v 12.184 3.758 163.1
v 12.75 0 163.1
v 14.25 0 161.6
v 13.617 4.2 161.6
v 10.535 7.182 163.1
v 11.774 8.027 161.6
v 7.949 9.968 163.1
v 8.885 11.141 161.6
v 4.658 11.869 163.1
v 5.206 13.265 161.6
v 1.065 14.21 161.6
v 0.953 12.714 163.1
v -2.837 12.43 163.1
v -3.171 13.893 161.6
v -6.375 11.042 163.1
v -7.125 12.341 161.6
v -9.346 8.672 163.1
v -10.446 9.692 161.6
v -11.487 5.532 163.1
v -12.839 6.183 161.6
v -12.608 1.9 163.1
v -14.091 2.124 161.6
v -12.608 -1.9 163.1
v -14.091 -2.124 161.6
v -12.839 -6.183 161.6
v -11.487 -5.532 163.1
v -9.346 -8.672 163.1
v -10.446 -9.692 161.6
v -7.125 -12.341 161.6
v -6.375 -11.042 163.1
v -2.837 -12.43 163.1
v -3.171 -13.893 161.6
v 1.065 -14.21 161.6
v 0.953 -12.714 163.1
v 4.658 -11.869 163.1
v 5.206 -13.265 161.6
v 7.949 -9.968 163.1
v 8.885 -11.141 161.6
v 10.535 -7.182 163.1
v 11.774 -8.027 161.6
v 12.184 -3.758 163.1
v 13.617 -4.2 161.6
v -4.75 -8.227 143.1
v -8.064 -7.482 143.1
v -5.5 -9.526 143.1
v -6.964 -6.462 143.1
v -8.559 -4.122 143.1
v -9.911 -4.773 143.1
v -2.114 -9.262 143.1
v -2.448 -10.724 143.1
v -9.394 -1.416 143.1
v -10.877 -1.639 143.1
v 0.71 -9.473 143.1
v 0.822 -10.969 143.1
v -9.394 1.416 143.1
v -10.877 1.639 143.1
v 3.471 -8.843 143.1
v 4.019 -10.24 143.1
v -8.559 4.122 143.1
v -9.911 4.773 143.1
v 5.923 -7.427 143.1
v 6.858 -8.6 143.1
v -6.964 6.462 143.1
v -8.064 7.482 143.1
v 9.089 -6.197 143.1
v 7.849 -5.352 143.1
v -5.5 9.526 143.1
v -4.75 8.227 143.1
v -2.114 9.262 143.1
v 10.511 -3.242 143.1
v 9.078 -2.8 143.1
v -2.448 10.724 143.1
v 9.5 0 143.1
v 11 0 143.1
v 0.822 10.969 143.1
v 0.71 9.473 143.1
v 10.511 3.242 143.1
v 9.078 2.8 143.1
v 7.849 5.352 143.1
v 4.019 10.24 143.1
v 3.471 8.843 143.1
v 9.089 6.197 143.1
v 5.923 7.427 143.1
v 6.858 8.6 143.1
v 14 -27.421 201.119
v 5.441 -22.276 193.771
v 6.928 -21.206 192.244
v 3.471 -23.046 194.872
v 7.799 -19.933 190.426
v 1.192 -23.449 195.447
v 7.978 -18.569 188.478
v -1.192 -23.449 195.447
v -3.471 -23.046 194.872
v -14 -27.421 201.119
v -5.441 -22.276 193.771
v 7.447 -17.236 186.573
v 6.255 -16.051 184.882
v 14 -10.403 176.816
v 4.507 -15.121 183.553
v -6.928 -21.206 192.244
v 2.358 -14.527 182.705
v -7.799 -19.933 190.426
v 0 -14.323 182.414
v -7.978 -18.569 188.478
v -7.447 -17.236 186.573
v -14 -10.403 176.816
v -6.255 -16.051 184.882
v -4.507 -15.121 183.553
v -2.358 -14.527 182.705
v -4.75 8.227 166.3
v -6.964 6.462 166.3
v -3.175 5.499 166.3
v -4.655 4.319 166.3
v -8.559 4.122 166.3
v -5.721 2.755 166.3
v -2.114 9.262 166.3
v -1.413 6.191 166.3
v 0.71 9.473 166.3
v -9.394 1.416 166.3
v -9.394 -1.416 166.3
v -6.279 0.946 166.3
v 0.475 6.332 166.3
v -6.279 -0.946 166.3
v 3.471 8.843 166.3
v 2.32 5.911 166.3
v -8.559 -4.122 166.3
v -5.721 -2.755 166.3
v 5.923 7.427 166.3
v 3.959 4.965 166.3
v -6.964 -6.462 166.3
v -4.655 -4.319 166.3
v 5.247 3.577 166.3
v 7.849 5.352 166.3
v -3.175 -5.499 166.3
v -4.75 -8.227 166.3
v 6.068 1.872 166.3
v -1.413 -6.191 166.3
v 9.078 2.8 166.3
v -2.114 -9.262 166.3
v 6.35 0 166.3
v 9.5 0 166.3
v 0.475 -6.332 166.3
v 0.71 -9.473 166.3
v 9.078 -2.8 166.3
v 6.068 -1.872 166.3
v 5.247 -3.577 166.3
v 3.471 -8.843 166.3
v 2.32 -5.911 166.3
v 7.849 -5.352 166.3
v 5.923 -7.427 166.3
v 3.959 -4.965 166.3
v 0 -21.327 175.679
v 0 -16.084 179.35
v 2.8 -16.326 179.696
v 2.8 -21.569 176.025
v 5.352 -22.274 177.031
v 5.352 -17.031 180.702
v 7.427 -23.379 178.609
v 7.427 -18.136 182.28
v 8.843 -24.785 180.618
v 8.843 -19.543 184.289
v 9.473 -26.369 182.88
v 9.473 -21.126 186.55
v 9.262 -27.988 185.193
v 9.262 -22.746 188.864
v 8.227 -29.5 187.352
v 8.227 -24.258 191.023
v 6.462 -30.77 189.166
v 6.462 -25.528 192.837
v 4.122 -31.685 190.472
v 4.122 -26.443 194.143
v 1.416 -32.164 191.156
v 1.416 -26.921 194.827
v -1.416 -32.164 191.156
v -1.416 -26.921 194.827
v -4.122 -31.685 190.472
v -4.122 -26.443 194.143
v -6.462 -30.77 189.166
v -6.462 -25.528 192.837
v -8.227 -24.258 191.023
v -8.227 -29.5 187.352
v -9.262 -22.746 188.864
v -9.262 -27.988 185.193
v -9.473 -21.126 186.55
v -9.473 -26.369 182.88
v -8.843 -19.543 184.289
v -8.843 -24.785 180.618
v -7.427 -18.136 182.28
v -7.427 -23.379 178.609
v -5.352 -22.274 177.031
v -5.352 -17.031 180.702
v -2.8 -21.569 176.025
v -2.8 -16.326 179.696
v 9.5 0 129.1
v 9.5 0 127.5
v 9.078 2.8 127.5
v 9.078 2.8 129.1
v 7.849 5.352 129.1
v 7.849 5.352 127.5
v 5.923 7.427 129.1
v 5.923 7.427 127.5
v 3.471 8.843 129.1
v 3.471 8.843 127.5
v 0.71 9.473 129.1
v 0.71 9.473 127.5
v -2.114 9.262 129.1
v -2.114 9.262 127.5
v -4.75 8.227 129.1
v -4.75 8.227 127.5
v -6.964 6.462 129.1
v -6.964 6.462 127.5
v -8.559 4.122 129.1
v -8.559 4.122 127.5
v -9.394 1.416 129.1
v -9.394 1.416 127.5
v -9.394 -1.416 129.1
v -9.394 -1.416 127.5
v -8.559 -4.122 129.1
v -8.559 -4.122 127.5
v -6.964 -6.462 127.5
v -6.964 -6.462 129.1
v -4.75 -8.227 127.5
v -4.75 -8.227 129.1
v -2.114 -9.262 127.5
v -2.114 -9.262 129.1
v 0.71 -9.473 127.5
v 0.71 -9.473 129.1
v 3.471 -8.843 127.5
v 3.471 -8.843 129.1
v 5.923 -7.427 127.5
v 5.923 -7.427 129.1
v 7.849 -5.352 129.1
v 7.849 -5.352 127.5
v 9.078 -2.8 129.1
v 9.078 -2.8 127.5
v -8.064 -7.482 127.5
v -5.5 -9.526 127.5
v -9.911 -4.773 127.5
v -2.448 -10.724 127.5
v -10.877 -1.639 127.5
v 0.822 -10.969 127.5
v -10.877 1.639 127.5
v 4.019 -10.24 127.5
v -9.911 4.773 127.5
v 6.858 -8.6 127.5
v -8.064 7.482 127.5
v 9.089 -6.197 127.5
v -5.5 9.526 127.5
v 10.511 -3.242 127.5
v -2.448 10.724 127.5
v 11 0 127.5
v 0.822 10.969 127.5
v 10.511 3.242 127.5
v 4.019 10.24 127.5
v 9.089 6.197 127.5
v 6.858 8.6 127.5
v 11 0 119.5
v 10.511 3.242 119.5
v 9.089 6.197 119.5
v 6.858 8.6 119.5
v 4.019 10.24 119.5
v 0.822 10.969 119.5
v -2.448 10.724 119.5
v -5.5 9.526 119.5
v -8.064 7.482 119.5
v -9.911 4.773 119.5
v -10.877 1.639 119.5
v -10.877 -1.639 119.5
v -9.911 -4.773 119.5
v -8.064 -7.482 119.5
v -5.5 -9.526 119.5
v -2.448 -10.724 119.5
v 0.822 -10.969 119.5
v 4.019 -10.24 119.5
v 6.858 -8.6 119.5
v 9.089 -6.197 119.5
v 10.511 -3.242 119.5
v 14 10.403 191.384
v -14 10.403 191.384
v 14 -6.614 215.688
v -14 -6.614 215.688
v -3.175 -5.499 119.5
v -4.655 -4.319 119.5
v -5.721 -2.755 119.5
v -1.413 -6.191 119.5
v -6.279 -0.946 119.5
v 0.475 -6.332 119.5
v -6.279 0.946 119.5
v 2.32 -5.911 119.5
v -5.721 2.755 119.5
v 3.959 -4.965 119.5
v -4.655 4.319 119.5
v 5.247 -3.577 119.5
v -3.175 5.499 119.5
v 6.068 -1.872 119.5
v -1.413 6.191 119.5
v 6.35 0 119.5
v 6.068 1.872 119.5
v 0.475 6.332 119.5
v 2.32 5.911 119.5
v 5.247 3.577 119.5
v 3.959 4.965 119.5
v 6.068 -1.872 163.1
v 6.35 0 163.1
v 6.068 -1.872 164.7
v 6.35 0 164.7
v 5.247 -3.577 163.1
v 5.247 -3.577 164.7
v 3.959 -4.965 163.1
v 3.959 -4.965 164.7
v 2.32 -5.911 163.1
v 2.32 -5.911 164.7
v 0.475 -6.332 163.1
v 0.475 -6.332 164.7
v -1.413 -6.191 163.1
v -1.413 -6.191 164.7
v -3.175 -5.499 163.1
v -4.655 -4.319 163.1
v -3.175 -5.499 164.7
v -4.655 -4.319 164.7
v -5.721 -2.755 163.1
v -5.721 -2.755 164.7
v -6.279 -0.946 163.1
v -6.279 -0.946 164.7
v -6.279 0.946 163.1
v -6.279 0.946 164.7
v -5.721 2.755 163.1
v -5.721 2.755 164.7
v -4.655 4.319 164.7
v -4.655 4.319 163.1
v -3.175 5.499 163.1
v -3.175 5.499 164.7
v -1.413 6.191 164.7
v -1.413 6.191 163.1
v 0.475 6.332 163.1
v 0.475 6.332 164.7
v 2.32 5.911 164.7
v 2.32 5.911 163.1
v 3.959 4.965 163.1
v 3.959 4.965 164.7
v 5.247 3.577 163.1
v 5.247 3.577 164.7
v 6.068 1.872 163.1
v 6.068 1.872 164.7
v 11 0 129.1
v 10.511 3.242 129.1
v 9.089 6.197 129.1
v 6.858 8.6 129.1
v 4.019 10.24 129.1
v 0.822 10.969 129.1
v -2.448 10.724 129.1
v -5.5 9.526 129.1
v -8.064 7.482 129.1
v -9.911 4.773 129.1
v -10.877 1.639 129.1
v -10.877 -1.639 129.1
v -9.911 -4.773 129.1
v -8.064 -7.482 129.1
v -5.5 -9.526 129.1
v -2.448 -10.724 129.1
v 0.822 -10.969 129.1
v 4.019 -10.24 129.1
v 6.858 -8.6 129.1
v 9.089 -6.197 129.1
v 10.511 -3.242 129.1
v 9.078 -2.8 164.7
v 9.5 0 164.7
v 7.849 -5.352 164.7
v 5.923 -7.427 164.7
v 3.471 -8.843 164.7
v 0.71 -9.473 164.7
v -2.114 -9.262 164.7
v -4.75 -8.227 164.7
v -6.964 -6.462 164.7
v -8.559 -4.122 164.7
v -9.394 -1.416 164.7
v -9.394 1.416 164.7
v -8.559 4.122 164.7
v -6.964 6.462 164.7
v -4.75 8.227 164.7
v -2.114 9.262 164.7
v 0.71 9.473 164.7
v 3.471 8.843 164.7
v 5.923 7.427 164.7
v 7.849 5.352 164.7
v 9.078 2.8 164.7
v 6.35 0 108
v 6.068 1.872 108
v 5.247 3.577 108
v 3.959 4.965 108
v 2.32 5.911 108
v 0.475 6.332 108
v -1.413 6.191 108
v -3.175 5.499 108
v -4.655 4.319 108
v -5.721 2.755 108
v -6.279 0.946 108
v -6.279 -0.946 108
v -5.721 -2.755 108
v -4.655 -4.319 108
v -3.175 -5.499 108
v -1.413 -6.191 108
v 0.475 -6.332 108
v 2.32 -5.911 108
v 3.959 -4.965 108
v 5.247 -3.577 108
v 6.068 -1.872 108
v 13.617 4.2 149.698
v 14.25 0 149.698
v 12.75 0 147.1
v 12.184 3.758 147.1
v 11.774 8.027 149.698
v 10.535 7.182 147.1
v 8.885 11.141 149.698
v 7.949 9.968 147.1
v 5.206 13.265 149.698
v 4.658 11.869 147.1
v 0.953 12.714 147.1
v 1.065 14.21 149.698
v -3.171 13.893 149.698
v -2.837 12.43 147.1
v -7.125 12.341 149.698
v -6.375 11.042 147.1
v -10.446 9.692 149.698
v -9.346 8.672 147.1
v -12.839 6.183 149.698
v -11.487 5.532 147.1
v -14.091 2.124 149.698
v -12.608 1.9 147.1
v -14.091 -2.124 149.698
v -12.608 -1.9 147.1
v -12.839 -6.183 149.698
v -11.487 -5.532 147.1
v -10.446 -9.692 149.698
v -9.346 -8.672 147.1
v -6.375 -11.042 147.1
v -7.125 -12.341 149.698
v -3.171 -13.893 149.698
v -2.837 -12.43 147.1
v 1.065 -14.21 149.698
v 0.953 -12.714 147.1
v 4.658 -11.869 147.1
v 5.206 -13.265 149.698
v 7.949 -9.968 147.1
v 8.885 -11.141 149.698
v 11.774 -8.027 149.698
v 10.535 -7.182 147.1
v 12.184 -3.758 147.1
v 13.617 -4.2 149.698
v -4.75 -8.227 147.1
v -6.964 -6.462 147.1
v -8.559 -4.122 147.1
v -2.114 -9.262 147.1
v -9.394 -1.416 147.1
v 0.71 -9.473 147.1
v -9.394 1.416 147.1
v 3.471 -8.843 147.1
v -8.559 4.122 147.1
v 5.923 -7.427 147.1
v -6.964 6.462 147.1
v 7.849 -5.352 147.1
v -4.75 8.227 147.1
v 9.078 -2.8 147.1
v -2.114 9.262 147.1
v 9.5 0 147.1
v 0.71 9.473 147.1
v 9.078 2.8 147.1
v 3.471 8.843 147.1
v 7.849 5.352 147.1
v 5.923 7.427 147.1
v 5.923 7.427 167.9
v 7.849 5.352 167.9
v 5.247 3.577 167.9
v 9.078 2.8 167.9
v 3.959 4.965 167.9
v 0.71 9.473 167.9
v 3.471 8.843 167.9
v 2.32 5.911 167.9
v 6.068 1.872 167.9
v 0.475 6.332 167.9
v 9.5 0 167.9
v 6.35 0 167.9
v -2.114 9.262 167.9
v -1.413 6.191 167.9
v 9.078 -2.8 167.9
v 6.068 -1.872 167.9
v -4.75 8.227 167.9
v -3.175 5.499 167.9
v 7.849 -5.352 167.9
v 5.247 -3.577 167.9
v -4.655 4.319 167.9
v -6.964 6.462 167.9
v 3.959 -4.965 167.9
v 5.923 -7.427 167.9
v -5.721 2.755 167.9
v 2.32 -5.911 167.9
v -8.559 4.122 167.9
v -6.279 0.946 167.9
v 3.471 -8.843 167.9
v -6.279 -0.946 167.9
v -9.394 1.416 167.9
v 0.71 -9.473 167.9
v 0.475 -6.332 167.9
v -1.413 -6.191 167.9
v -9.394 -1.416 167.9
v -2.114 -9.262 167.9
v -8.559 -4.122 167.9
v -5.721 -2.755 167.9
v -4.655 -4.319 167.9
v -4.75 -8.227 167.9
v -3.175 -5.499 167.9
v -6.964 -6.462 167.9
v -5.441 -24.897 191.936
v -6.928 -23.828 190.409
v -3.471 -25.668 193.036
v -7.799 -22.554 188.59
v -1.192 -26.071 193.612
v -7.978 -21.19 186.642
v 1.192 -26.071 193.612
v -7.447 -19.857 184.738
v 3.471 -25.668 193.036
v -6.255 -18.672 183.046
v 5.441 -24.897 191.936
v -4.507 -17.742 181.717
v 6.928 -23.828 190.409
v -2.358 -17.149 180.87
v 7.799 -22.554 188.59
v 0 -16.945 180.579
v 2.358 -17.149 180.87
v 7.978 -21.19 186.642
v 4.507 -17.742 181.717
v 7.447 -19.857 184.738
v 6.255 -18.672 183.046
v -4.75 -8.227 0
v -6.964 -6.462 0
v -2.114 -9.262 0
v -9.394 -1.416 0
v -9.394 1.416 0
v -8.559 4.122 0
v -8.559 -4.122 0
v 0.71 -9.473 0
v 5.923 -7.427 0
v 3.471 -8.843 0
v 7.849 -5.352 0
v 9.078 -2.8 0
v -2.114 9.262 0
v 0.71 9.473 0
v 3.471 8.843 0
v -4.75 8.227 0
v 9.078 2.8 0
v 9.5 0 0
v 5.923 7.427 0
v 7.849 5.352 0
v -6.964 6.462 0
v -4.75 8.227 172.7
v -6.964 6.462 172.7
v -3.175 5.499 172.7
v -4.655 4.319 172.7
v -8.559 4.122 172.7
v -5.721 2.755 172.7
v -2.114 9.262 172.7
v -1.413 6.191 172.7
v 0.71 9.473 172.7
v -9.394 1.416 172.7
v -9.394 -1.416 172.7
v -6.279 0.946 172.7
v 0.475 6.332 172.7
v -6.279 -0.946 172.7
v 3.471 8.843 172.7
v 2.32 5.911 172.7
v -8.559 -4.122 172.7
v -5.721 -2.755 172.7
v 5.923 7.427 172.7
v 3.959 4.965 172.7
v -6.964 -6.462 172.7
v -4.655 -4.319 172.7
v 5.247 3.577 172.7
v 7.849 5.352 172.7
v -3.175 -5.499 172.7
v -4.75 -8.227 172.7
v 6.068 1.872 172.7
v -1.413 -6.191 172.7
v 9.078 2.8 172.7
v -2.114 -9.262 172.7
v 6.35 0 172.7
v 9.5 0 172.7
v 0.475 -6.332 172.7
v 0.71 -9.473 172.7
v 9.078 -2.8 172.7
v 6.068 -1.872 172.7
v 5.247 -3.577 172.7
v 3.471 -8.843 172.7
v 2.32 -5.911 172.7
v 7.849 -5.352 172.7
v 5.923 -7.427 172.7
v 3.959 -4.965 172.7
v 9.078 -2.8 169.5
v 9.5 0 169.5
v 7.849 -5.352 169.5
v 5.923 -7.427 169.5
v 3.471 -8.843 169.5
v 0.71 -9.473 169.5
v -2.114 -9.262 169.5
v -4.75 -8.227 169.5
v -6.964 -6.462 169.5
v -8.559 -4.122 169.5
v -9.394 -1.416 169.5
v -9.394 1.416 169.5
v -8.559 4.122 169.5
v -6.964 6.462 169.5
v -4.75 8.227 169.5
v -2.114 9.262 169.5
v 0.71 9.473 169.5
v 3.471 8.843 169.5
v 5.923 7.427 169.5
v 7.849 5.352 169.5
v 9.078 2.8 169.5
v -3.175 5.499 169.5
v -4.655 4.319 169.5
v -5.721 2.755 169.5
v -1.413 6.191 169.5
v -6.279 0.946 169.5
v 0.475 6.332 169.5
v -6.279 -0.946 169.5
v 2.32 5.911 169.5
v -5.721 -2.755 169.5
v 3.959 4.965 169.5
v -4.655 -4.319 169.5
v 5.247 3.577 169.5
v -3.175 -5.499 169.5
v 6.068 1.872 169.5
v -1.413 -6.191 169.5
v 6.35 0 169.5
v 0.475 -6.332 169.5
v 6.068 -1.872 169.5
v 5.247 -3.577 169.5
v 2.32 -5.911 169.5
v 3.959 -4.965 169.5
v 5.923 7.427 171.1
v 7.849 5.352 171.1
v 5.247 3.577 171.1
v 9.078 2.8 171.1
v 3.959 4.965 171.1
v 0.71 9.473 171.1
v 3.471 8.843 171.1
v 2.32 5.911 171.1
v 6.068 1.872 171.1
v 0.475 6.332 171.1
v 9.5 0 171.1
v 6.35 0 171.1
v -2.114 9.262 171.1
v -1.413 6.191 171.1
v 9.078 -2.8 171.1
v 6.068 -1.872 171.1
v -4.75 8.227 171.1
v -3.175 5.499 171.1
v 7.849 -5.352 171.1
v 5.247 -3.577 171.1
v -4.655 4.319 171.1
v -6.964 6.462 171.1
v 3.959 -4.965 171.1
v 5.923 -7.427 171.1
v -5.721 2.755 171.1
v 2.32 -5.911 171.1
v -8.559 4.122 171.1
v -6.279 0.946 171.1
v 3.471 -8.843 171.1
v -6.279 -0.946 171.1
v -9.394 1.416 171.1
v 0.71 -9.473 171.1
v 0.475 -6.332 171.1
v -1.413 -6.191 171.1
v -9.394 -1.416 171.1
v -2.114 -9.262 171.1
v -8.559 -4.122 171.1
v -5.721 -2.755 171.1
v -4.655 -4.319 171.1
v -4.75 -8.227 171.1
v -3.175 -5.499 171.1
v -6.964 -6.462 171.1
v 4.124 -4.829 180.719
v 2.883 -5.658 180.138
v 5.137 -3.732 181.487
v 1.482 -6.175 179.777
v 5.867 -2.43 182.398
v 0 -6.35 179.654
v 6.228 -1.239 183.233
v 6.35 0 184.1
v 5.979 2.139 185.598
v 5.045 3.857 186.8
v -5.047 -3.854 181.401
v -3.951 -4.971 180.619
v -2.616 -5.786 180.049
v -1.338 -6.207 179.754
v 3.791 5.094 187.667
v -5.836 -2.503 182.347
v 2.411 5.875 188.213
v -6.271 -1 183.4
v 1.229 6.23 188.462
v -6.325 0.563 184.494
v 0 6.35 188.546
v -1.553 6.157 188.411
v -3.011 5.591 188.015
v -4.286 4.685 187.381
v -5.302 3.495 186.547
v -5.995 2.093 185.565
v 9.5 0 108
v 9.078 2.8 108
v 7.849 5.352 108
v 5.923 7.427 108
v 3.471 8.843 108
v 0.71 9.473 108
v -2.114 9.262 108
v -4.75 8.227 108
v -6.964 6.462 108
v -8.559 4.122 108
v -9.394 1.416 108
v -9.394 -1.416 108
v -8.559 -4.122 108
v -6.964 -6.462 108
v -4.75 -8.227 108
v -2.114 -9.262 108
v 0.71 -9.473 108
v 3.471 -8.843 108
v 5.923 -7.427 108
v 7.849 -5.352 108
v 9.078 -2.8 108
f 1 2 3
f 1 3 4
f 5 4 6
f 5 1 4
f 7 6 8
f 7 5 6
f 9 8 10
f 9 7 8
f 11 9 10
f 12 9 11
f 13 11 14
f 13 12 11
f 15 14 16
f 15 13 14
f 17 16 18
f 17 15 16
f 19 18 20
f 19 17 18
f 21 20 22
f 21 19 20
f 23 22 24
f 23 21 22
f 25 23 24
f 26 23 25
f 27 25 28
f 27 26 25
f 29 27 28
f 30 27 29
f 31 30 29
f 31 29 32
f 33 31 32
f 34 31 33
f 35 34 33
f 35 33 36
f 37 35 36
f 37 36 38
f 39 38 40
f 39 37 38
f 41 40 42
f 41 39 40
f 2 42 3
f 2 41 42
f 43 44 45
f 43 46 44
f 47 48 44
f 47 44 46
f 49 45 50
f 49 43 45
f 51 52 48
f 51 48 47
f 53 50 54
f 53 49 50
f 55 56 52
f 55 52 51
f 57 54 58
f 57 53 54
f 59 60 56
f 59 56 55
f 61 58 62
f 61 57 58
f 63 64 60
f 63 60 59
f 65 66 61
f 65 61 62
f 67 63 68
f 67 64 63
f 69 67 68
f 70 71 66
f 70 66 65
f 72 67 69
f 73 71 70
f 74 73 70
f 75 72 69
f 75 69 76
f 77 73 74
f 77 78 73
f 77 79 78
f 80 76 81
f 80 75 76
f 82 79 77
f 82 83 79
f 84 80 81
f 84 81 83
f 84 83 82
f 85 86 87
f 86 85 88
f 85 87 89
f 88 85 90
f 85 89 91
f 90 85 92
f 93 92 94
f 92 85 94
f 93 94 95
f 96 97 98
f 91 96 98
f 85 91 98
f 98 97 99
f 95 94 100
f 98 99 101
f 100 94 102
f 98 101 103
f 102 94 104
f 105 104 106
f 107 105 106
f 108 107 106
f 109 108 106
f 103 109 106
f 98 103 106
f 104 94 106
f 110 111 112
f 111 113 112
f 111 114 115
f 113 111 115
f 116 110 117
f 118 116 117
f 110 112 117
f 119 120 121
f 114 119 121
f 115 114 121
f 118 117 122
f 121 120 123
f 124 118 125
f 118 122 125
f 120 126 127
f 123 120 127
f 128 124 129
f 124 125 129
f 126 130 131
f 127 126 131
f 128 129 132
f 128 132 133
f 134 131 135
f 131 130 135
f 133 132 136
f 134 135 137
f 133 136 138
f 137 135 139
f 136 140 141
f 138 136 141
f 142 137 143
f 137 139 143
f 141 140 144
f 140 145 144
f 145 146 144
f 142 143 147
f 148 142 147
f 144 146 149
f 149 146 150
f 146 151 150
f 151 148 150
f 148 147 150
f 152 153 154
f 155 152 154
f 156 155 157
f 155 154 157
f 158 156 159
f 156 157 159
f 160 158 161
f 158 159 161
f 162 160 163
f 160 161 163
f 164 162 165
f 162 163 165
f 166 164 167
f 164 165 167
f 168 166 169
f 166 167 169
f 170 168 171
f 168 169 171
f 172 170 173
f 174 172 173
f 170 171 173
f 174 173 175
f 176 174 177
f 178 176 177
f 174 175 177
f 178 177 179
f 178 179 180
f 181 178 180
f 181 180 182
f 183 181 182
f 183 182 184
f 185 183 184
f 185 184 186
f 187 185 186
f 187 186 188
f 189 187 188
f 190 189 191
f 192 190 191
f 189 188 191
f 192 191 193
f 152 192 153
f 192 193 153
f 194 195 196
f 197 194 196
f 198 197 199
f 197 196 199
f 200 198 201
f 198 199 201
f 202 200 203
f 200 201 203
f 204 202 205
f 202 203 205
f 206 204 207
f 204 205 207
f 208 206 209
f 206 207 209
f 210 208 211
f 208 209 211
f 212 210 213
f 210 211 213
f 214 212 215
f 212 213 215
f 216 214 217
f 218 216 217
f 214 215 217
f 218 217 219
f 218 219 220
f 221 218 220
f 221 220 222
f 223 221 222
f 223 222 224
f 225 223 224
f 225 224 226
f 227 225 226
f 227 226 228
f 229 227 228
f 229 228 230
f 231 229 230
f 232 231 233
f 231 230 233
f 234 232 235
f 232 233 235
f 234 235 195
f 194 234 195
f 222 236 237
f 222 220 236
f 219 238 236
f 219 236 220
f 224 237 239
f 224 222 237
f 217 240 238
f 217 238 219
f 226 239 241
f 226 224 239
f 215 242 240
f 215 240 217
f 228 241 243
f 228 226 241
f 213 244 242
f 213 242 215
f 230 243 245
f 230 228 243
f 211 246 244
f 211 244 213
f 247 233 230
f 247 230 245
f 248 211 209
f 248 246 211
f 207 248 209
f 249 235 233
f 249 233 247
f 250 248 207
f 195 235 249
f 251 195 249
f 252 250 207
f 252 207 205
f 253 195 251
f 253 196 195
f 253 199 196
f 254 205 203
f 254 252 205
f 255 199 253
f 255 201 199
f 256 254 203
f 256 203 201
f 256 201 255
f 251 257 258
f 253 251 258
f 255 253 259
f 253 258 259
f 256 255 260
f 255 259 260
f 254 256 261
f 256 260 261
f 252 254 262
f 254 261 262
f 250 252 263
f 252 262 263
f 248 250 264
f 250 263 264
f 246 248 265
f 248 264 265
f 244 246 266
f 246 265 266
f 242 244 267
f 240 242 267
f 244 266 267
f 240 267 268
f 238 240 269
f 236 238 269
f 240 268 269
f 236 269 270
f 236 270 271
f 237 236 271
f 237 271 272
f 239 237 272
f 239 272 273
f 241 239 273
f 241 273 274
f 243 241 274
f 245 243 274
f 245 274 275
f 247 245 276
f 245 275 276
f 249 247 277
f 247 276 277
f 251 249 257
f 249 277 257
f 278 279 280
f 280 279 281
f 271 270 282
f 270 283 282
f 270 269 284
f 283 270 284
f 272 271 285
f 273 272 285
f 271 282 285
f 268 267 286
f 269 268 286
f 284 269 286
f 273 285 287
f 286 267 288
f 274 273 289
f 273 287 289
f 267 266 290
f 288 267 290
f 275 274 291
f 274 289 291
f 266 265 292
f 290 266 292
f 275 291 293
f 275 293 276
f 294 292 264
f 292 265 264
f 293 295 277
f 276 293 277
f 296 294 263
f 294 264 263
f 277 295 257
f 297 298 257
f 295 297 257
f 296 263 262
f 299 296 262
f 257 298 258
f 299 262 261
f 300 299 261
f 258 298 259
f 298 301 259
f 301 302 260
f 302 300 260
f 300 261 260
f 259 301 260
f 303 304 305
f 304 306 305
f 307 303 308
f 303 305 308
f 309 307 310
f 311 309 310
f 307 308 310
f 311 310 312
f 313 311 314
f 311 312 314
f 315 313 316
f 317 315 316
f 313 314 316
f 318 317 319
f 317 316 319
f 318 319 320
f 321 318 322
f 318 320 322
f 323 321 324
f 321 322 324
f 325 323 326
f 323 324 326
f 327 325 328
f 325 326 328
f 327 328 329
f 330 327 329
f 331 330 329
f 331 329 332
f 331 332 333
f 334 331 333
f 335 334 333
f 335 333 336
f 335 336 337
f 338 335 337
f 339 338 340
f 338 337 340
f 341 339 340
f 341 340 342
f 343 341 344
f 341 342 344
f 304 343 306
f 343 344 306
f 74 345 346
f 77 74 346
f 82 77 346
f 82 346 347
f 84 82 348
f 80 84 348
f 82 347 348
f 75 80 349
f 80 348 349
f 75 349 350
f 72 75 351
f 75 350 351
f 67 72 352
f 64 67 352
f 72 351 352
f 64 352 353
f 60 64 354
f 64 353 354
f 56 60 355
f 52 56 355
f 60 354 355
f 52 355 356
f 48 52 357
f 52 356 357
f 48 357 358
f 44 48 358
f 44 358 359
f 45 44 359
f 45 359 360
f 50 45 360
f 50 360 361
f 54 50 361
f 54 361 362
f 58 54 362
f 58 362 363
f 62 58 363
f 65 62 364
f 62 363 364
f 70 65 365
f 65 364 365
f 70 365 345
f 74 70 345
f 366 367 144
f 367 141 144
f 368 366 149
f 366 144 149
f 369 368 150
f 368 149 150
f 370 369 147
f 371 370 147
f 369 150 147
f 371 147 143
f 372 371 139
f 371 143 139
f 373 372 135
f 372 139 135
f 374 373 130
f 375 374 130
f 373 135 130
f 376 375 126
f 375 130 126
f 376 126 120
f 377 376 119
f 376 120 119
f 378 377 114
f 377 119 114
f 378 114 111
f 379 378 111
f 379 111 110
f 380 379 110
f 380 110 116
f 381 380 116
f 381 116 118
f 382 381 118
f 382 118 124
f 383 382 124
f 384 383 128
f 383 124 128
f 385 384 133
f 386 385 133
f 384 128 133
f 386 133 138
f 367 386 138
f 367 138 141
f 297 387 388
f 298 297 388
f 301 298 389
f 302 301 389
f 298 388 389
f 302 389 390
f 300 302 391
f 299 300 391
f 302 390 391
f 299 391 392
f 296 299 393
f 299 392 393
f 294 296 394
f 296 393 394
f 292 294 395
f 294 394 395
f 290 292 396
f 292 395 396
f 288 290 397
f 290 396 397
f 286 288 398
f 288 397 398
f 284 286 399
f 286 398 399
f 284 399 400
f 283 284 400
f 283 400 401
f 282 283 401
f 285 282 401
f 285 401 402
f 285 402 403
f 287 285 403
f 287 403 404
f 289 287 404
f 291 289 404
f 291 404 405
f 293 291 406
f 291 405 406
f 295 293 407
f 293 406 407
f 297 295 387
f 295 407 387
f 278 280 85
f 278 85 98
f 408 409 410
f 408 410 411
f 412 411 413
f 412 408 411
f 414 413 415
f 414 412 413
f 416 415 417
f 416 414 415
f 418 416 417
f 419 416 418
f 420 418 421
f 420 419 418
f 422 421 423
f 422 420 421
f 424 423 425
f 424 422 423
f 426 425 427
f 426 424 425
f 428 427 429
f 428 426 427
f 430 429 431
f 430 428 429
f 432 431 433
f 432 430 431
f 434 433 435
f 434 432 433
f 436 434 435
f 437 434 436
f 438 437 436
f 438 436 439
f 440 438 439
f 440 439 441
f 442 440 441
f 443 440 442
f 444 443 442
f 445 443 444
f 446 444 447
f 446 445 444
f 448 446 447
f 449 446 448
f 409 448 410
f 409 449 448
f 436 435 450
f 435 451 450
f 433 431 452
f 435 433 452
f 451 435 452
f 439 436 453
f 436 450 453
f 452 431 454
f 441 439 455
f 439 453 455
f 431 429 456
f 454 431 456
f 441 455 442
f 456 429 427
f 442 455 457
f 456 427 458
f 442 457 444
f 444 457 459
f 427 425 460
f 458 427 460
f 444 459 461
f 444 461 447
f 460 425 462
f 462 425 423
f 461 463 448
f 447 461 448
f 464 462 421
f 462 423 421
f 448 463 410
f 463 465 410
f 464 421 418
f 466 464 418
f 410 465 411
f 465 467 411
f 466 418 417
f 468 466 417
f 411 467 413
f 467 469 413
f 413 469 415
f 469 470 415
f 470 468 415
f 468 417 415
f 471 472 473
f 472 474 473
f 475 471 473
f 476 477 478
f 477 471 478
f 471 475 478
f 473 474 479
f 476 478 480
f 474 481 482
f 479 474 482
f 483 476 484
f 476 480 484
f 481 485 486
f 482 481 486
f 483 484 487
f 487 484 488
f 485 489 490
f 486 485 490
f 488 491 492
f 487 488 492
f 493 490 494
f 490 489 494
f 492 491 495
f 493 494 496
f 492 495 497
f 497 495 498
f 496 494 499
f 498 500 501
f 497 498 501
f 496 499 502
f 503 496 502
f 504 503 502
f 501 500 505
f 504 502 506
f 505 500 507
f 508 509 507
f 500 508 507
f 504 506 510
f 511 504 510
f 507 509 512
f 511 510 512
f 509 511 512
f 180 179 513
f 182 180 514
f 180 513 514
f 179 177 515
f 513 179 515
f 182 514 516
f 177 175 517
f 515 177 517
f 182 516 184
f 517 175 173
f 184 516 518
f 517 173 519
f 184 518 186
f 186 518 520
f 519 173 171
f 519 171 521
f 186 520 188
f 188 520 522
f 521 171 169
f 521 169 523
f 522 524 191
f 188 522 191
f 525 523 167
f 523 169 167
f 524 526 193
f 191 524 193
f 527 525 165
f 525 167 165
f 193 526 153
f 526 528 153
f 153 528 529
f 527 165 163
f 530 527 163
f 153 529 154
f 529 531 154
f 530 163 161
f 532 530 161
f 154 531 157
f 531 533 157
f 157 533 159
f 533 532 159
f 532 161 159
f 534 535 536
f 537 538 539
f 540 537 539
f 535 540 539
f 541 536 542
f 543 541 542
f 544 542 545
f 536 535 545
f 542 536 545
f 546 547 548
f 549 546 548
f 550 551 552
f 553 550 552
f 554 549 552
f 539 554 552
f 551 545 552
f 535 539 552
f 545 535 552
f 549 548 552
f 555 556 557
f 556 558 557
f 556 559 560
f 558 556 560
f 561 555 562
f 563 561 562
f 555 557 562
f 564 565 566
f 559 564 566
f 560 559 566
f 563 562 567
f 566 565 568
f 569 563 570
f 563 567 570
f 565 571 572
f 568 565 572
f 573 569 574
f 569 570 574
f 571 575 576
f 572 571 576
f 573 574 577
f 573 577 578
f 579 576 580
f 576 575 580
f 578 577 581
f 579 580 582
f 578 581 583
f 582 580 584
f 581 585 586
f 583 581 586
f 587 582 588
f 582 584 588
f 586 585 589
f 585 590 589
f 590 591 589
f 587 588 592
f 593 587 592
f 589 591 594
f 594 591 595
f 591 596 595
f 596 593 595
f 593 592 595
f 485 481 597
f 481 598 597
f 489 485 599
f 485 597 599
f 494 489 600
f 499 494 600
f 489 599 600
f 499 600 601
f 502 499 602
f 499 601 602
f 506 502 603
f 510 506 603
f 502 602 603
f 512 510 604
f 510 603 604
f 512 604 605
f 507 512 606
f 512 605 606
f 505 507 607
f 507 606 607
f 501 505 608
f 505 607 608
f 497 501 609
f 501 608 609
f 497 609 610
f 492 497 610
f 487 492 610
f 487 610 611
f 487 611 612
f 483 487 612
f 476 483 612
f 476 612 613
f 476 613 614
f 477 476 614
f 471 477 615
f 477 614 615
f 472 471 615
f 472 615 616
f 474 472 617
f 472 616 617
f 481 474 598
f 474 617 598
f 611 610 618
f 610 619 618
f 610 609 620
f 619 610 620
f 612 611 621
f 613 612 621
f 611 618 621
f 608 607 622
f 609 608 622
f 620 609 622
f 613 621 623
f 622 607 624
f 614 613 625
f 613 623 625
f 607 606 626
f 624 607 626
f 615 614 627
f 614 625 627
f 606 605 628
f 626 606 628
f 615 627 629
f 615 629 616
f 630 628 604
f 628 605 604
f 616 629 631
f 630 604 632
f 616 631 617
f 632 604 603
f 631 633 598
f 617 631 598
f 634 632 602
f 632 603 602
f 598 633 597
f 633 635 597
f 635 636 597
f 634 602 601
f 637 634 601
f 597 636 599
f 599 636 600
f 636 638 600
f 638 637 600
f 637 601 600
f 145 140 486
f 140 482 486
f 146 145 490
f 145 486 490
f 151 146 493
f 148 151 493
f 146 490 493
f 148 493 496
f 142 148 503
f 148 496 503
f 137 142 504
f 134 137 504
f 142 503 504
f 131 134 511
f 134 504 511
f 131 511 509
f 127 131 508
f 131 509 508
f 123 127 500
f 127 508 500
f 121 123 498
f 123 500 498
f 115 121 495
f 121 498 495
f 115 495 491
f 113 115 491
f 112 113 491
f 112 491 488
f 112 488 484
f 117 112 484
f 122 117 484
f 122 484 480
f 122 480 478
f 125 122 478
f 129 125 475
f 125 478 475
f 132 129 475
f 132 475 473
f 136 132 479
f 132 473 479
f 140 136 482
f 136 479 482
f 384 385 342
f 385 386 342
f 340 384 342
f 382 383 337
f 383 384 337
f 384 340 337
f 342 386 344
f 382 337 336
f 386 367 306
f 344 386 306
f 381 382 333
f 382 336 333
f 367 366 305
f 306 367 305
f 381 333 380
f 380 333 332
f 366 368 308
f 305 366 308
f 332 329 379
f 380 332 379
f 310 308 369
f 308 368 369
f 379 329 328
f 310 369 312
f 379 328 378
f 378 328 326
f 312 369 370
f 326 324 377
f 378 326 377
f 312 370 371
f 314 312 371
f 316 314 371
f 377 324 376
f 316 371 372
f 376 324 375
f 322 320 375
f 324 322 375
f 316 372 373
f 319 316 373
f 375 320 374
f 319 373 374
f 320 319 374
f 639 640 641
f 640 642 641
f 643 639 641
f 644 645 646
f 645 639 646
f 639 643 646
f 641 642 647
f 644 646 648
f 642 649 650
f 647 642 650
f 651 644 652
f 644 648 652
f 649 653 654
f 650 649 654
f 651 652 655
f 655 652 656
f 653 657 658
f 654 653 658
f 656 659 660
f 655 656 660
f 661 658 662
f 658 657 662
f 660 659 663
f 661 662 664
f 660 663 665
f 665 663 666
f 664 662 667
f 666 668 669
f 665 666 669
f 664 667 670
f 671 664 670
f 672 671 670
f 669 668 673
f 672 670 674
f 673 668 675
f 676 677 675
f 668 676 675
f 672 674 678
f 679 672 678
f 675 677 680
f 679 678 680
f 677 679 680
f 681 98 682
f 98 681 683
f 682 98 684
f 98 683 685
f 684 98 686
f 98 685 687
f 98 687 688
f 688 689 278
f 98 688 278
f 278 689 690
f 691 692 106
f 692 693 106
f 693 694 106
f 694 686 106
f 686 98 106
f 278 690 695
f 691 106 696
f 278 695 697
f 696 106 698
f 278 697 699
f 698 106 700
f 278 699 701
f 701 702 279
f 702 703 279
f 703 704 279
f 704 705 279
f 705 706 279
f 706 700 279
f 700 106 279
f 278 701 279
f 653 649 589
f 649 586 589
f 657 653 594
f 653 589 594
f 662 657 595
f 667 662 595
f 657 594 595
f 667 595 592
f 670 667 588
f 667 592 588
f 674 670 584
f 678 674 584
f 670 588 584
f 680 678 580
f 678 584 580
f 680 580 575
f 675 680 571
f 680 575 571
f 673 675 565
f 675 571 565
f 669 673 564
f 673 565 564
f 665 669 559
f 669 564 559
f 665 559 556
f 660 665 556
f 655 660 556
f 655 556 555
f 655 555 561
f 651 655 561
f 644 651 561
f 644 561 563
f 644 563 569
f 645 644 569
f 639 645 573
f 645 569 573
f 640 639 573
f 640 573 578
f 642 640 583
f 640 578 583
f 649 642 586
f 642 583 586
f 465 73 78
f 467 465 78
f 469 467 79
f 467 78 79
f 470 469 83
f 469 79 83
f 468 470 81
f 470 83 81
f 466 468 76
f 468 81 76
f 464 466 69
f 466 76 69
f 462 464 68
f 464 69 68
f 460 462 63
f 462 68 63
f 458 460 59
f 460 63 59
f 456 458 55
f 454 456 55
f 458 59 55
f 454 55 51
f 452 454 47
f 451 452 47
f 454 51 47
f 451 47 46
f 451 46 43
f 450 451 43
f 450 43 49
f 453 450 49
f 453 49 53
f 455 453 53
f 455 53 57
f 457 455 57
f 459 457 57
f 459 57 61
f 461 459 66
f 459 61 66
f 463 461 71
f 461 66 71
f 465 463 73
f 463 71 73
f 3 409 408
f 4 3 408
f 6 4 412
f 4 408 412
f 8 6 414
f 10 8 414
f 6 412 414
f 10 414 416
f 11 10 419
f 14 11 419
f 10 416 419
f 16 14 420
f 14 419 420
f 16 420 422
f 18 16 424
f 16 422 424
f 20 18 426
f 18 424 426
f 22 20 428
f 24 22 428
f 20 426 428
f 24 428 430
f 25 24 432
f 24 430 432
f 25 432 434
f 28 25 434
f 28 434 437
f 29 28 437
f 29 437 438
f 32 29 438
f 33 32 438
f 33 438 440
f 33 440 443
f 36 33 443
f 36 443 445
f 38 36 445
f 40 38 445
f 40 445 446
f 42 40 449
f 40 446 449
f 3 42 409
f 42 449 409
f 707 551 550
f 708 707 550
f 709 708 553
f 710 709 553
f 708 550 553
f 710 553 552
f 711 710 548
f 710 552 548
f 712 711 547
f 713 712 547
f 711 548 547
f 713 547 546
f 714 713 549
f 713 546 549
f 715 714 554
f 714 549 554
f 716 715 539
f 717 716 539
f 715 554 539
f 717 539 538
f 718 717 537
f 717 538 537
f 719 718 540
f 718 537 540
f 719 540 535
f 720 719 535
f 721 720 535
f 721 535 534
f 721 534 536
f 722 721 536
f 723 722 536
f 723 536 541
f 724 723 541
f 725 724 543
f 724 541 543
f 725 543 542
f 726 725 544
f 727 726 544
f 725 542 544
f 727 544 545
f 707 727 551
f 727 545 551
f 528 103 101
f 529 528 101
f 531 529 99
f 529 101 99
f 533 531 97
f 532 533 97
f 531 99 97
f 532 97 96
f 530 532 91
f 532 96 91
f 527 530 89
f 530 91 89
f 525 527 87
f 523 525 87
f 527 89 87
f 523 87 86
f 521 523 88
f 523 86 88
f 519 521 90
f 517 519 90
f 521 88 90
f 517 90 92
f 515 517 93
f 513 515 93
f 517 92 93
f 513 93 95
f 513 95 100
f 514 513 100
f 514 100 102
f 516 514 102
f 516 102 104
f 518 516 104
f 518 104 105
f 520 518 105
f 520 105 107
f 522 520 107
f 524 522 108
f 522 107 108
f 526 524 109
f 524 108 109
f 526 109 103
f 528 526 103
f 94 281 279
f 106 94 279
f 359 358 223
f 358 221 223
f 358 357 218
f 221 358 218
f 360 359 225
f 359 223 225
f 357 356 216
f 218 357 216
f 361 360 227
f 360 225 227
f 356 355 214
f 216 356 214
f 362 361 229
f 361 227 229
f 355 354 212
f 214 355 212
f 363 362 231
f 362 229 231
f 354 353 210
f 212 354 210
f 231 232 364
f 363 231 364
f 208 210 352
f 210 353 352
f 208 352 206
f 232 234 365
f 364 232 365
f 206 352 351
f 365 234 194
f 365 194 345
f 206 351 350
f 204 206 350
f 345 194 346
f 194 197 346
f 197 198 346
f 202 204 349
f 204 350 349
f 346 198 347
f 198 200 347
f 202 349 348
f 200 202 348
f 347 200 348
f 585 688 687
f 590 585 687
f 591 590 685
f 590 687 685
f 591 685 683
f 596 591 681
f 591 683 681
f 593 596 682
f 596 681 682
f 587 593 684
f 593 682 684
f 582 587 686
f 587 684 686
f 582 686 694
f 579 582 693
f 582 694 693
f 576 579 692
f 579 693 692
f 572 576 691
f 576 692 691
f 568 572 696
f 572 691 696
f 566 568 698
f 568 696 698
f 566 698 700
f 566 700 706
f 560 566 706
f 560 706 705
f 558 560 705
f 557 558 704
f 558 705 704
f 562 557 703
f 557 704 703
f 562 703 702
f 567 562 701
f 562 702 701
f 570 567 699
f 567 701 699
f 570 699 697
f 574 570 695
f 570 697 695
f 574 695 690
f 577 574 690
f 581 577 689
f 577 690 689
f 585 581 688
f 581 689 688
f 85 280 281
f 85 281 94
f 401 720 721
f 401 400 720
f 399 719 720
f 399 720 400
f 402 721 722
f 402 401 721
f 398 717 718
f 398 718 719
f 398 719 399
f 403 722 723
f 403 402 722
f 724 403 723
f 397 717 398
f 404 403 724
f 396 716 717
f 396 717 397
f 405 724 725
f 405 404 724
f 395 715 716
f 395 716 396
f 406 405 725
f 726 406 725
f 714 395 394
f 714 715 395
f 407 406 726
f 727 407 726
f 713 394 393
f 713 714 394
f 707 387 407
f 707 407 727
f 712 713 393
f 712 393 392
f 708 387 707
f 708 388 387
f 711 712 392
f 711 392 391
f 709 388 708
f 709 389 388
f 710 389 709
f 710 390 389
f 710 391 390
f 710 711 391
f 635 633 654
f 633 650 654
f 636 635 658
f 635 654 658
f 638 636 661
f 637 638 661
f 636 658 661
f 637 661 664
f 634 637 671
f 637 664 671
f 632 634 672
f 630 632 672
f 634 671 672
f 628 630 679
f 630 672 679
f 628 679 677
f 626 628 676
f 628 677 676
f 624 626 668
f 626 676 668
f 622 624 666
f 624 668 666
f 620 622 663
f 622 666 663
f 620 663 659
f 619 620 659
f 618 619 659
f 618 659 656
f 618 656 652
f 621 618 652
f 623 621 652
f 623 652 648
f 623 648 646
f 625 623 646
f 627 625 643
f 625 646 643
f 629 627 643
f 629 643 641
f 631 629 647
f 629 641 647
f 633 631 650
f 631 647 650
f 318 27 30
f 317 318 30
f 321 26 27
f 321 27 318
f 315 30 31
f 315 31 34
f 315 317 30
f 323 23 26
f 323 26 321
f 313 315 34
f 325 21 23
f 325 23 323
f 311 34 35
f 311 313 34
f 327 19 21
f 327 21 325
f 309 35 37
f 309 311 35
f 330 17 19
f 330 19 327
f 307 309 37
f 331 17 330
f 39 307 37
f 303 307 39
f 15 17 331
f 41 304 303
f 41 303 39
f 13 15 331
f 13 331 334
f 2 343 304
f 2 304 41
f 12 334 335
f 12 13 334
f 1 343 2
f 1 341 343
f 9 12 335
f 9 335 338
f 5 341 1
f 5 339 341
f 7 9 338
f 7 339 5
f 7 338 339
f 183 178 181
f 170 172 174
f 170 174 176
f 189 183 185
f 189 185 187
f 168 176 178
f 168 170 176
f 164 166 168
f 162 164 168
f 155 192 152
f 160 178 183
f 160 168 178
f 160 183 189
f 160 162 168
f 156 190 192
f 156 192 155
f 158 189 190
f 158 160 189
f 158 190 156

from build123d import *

# Parameters (mm, degrees)
SKETCH_1_R               = 9.5
EXTRUDE_1_DEPTH          = 108
SKETCH_2_R               = 6.35
EXTRUDE_2_DEPTH          = 11.5
SKETCH_3_R               = 11
EXTRUDE_3_DEPTH          = 8
SKETCH_4_R               = 9.5
EXTRUDE_4_DEPTH          = 1.6
SKETCH_5_R               = 11
EXTRUDE_5_DEPTH          = 14
SKETCH_6_R               = 9.5
EXTRUDE_6_DEPTH          = 4
SKETCH_7_R               = 14.25
EXTRUDE_7_DEPTH          = 16
CHAMFER_1_SIZE           = 1.5
CUT_EXTRUDE_1_DEPTH      = 195.148744523
CUT_EXTRUDE_1_DEPTH_BACK = 195.148744523
EXTRUDE_8_DEPTH          = 14
EXTRUDE_8_DEPTH_BACK     = 14
SKETCH_12_R              = 8
EXTRUDE_9_DEPTH          = 3.2
SKETCH_13_R              = 9.5
EXTRUDE_10_DEPTH         = 6.4
CHAMFER_2_SIZE           = 1.5
CHAMFER_2_SIZE2          = 2.598076211


with BuildPart() as part:
    # Эскиз1 → Бобышка-Вытянуть1 (new body)
    with BuildSketch(Plane.XY):
        Circle(SKETCH_1_R)
    extrude(amount=EXTRUDE_1_DEPTH)

    # Эскиз2 → Бобышка-Вытянуть2 (add)
    with BuildSketch(Plane.XY.offset(108)):
        Circle(SKETCH_2_R)
    extrude(amount=EXTRUDE_2_DEPTH)

    # Эскиз3 → Бобышка-Вытянуть3 (add)
    with BuildSketch(Plane.XY.offset(119.5)):
        Circle(SKETCH_3_R)
    extrude(amount=EXTRUDE_3_DEPTH)

    # Эскиз4 → Бобышка-Вытянуть4 (add)
    with BuildSketch(Plane.XY.offset(127.5)):
        Circle(SKETCH_4_R)
    extrude(amount=EXTRUDE_4_DEPTH)

    # Эскиз5 → Бобышка-Вытянуть5 (add)
    with BuildSketch(Plane.XY.offset(129.1)):
        Circle(SKETCH_5_R)
    extrude(amount=EXTRUDE_5_DEPTH)

    # Эскиз6 → Бобышка-Вытянуть6 (add)
    with BuildSketch(Plane.XY.offset(143.1)):
        Circle(SKETCH_6_R)
    extrude(amount=EXTRUDE_6_DEPTH)

    # Эскиз7 → Бобышка-Вытянуть7 (add)
    with BuildSketch(Plane.XY.offset(147.1)):
        Circle(SKETCH_7_R)
    extrude(amount=EXTRUDE_7_DEPTH)

    # Фаска1
    chamfer_1_edges = [part.edges().sort_by_distance(p)[0] for p in [
        (-14.25, 0, 163.1),
    ]]
    chamfer(chamfer_1_edges, length=CHAMFER_1_SIZE)

    # Эскиз8 → Повернуть1 (revolve)
    with BuildSketch(Plane(origin=(0, 0, 0), x_dir=(0, 0, -1), z_dir=(1, 0, 0))):
        Polygon((-163.1, 6.35), (-164.7, 6.35), (-164.7, 9.5), (-166.3, 9.5), (-166.3, 6.35), (-167.9, 6.35), (-167.9, 9.5), (-169.5, 9.5), (-169.5, 6.35), (-171.1, 6.35), (-171.1, 9.5), (-172.7, 9.5), (-172.7, 6.35), (-193.1, 6.35), (-193.1, 0), (-163.1, 0), align=None)
    revolve(axis=Axis((0, 0, 193.1), (0, 0, -1)))

    # Эскиз9 → Вырез-Вытянуть1 (cut, two sides: drawn at the far end of the back side and taken through both)
    with BuildSketch(Plane(origin=(0, 0, 0), x_dir=(0, 0, -1), z_dir=(1, 0, 0)).offset(-CUT_EXTRUDE_1_DEPTH_BACK)):
        Polygon((-179.653682132, -6.35), (-188.546317868, 6.35), (-193.1, 6.35), (-193.1, -6.35), align=None)
    extrude(amount=CUT_EXTRUDE_1_DEPTH + CUT_EXTRUDE_1_DEPTH_BACK, mode=Mode.SUBTRACT)

    # Эскиз10 → Бобышка-Вытянуть8 (add, two sides: drawn at the far end of the back side and taken through both)
    with BuildSketch(Plane(origin=(0, 0, 0), x_dir=(0, 0, -1), z_dir=(1, 0, 0)).offset(-EXTRUDE_8_DEPTH_BACK)):
        Polygon((-176.815579258, -10.403230962), (-191.384420742, 10.403230962), (-215.688134824, -6.614412844), (-201.119293341, -27.420874769), align=None)
    extrude(amount=EXTRUDE_8_DEPTH + EXTRUDE_8_DEPTH_BACK)

    # Эскиз12 → Бобышка-Вытянуть9 (add)
    with BuildSketch(Plane(origin=(0, 76.095474781, 53.282625065), x_dir=(1, 0, 0), z_dir=(0, -0.8191520442889946, -0.5735764363510424))):
        with Locations((0, 165.640569636)):
            Circle(SKETCH_12_R)
    extrude(amount=EXTRUDE_9_DEPTH)

    # Эскиз13 → Бобышка-Вытянуть10 (add)
    with BuildSketch(Plane(origin=(0, 73.474188239, 51.447180469), x_dir=(1, 0, 0), z_dir=(0, -0.8191520442889944, -0.5735764363510425))):
        with Locations((0, 165.640569636)):
            Circle(SKETCH_13_R)
    extrude(amount=EXTRUDE_10_DEPTH)

    # Фаска2
    chamfer_2_edges = [part.edges().sort_by_distance(p)[0] for p in [
        (-14.25, 0, 147.1),
    ]]
    chamfer_2_side = [part.faces().sort_by_distance(p)[0] for p in [
        (-13.846949135, 0, 147.1),
    ]]
    chamfer(chamfer_2_edges, length=CHAMFER_2_SIZE, length2=CHAMFER_2_SIZE2, reference=chamfer_2_side[0])


solid = part.part
